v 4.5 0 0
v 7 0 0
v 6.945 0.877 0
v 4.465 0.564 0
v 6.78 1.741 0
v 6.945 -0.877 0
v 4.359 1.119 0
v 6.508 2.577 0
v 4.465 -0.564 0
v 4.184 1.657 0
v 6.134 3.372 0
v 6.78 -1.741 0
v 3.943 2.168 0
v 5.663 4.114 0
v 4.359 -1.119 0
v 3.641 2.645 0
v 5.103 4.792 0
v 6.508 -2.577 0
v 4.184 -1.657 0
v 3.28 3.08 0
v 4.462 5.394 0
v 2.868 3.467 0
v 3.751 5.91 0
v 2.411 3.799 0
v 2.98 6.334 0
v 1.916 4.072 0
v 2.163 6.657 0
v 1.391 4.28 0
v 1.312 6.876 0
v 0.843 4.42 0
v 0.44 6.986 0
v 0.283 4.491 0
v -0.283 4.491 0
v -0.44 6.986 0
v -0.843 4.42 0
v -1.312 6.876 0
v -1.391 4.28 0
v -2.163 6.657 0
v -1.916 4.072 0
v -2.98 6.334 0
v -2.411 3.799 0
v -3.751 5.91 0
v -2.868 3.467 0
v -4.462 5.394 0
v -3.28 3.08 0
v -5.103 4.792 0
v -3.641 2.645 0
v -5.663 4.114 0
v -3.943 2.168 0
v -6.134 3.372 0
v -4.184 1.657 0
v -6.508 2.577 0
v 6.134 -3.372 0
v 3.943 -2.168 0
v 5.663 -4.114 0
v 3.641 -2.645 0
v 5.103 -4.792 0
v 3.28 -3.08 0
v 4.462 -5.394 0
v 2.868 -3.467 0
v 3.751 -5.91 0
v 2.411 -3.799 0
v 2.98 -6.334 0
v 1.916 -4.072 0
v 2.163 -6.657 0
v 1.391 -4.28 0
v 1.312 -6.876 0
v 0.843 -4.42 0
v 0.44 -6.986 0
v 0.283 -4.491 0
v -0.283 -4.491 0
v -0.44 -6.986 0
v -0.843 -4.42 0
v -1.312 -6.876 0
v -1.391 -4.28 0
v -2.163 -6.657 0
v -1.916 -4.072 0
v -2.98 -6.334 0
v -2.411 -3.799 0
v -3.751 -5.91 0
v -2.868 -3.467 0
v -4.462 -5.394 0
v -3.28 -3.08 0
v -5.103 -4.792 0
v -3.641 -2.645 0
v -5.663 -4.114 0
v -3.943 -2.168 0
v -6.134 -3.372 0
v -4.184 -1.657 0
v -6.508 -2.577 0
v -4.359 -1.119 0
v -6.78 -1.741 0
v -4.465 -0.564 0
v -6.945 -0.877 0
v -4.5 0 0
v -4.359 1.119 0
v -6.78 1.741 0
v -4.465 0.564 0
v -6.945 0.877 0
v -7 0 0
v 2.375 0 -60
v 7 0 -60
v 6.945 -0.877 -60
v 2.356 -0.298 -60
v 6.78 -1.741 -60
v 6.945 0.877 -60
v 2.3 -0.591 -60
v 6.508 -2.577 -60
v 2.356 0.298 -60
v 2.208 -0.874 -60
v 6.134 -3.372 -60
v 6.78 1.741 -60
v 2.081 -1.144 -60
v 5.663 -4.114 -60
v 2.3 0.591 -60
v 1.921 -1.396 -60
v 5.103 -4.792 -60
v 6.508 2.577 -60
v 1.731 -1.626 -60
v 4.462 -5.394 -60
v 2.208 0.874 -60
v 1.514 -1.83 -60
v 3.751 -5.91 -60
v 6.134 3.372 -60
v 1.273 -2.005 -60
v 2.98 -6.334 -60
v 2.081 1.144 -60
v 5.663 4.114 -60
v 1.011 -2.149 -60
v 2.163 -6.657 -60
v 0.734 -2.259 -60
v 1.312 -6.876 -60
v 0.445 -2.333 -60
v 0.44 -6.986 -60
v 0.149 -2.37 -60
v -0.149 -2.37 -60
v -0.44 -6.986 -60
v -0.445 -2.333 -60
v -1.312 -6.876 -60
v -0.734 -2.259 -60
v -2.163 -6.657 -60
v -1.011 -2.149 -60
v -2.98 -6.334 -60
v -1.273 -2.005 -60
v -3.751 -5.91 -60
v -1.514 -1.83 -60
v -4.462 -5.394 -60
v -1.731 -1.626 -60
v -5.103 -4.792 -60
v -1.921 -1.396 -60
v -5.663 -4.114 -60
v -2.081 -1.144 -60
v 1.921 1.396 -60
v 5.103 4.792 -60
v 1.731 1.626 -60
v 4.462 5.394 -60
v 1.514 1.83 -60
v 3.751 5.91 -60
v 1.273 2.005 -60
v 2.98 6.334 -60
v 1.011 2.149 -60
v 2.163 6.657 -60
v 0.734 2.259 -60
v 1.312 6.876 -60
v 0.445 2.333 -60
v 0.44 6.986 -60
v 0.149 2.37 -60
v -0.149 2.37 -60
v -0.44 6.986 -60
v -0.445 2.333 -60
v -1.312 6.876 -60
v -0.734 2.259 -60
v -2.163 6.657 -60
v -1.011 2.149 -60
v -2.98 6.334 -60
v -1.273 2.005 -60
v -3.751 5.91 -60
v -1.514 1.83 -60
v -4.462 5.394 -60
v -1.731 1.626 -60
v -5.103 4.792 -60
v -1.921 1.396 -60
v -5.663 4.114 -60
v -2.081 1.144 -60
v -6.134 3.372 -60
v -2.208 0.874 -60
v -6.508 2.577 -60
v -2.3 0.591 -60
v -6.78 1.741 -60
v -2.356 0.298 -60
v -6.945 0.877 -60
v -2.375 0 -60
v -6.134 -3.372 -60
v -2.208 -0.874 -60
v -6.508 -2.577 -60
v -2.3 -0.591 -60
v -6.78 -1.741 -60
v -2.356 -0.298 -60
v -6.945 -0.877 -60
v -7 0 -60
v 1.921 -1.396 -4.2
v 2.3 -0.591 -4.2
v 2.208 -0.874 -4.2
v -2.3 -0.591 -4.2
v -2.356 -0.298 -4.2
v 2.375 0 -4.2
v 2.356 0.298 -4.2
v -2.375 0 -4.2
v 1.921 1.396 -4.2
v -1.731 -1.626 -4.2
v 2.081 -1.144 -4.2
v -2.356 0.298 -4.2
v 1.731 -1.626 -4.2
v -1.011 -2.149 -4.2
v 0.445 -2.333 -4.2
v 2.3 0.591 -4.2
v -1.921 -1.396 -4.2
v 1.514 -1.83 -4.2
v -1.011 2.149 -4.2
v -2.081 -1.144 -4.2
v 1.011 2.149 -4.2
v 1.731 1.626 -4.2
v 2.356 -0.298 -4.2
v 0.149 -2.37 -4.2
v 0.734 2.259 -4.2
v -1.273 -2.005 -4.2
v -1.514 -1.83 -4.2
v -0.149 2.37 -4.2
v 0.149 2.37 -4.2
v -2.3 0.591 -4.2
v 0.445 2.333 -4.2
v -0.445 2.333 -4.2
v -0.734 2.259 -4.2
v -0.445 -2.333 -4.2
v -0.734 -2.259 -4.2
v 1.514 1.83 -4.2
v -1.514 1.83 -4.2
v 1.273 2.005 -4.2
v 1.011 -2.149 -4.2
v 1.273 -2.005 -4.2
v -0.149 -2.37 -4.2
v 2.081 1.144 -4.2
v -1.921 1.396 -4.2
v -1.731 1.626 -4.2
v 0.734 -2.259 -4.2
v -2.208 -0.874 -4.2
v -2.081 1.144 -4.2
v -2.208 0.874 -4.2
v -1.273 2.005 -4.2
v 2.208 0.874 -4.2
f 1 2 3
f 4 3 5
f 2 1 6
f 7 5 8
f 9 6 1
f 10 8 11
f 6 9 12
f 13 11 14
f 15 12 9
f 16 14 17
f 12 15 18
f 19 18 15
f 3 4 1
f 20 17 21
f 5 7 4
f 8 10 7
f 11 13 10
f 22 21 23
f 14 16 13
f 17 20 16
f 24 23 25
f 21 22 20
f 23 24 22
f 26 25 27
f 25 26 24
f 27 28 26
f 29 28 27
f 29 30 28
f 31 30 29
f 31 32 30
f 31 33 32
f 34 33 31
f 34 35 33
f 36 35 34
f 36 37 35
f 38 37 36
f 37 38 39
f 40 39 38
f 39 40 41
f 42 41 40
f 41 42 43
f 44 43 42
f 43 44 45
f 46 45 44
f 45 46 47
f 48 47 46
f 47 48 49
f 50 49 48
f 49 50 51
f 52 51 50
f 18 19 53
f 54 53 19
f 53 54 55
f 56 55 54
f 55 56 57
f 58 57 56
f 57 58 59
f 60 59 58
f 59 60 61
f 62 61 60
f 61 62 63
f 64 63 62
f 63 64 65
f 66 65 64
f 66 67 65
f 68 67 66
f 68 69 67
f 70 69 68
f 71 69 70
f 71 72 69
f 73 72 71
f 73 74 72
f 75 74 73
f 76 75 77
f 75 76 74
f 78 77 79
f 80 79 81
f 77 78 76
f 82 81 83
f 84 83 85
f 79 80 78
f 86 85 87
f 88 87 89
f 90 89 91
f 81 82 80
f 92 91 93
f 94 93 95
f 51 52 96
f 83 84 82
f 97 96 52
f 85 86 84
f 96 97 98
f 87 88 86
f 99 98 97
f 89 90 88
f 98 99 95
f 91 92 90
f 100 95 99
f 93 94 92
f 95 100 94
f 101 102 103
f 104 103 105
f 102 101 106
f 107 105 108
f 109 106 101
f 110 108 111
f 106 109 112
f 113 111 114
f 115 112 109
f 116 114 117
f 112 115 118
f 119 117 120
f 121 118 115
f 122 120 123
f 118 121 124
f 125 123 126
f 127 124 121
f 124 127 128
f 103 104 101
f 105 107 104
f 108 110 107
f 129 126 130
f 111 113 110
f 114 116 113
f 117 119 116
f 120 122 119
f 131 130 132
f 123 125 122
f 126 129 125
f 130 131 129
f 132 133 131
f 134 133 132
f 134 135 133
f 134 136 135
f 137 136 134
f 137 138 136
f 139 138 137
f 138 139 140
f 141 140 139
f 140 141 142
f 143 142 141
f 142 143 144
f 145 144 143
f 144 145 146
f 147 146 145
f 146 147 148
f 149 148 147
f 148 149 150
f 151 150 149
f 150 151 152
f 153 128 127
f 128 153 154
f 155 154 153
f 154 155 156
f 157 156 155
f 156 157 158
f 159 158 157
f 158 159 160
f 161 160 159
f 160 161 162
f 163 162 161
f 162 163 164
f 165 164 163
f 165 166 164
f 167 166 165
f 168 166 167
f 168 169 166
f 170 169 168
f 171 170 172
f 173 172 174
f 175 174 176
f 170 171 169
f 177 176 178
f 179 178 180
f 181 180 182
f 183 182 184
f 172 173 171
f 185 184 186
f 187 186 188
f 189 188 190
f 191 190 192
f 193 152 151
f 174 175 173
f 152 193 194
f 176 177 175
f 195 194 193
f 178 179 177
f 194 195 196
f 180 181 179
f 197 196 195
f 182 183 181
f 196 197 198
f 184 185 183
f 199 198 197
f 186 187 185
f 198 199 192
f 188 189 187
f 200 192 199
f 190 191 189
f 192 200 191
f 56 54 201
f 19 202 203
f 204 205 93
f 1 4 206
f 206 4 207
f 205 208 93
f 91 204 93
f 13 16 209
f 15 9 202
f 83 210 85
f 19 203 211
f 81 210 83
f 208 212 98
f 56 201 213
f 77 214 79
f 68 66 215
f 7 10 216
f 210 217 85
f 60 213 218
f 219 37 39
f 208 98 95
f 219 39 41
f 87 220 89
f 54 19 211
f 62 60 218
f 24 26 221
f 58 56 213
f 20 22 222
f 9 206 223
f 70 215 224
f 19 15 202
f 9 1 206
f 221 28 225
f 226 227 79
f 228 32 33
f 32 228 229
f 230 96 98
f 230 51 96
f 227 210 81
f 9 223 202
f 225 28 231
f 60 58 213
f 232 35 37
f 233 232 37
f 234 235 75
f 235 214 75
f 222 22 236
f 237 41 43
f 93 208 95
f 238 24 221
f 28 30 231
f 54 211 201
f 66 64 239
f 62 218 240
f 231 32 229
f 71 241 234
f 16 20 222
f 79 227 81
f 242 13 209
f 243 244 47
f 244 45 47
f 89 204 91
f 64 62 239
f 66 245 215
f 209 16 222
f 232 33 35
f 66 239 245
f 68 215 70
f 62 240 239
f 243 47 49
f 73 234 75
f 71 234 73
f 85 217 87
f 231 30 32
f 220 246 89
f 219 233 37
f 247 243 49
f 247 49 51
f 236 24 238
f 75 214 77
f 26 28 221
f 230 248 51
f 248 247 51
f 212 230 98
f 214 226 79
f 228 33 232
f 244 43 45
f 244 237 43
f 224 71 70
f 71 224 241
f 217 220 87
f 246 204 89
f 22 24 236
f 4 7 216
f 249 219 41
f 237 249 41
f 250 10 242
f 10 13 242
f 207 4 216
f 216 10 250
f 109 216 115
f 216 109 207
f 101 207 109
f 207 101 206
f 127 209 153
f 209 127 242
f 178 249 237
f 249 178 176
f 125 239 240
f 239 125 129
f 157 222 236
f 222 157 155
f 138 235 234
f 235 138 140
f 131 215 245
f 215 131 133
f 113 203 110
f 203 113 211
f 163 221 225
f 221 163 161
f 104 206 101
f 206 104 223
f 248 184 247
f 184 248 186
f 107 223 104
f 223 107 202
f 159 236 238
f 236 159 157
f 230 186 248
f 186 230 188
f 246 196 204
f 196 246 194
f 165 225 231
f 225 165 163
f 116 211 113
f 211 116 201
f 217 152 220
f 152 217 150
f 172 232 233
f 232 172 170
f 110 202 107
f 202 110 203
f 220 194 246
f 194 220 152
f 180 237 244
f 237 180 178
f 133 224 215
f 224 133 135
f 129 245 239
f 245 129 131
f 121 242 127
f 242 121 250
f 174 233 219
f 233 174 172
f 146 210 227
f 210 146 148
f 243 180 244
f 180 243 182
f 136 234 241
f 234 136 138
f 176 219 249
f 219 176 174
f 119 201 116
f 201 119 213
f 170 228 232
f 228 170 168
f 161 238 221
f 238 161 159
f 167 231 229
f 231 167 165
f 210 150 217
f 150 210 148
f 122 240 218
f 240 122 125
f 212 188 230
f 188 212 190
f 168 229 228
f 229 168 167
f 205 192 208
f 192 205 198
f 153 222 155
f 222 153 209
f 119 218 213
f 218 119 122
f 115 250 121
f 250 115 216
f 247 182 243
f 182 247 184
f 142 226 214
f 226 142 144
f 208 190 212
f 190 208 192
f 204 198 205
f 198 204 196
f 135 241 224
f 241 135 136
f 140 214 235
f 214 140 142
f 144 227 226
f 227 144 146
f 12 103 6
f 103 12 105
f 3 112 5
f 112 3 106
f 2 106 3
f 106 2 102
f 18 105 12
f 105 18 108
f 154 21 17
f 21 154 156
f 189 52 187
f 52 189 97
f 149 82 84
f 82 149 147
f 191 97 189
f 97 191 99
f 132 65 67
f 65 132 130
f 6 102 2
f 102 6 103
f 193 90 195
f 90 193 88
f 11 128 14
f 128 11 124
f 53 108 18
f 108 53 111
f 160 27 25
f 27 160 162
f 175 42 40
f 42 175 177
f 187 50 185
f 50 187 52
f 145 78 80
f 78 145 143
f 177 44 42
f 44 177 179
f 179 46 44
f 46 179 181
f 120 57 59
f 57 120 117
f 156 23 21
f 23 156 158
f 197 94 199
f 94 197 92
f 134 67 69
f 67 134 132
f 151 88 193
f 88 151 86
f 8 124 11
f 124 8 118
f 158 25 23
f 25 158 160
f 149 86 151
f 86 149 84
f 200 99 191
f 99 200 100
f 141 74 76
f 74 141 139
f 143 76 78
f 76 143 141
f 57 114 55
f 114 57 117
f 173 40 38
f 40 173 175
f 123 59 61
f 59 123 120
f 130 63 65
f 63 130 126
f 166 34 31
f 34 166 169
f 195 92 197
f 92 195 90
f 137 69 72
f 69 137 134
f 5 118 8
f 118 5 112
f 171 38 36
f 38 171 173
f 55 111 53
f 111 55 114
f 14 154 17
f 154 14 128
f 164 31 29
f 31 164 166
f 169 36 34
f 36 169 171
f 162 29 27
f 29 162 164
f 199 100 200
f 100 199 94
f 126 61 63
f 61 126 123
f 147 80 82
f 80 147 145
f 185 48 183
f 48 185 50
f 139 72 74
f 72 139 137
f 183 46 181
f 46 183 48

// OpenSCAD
$fn = 50;


difference() {
	union() {
		translate(v = [0, 0, -60.0000000000]) {
			cylinder(h = 60, r = 7.0000000000);
		}
		cylinder(h = 0, r = 16.0000000000);
	}
	union() {
		translate(v = [0, 0, 0]) {
			rotate(a = [0, 0, 0]) {
				difference() {
					union() {
						#translate(v = [0, 0, -60.0000000000]) {
							cylinder(h = 60, r = 2.2500000000);
						}
						#translate(v = [0, 0, -4.2000000000]) {
							cylinder(h = 4.2000000000, r1 = 2.3750000000, r2 = 4.5000000000);
						}
						#translate(v = [0, 0, -60.0000000000]) {
							cylinder(h = 60, r = 2.3750000000);
						}
						#translate(v = [0, 0, -60.0000000000]) {
							cylinder(h = 60, r = 2.2500000000);
						}
					}
					union();
				}
			}
		}
	}
}
